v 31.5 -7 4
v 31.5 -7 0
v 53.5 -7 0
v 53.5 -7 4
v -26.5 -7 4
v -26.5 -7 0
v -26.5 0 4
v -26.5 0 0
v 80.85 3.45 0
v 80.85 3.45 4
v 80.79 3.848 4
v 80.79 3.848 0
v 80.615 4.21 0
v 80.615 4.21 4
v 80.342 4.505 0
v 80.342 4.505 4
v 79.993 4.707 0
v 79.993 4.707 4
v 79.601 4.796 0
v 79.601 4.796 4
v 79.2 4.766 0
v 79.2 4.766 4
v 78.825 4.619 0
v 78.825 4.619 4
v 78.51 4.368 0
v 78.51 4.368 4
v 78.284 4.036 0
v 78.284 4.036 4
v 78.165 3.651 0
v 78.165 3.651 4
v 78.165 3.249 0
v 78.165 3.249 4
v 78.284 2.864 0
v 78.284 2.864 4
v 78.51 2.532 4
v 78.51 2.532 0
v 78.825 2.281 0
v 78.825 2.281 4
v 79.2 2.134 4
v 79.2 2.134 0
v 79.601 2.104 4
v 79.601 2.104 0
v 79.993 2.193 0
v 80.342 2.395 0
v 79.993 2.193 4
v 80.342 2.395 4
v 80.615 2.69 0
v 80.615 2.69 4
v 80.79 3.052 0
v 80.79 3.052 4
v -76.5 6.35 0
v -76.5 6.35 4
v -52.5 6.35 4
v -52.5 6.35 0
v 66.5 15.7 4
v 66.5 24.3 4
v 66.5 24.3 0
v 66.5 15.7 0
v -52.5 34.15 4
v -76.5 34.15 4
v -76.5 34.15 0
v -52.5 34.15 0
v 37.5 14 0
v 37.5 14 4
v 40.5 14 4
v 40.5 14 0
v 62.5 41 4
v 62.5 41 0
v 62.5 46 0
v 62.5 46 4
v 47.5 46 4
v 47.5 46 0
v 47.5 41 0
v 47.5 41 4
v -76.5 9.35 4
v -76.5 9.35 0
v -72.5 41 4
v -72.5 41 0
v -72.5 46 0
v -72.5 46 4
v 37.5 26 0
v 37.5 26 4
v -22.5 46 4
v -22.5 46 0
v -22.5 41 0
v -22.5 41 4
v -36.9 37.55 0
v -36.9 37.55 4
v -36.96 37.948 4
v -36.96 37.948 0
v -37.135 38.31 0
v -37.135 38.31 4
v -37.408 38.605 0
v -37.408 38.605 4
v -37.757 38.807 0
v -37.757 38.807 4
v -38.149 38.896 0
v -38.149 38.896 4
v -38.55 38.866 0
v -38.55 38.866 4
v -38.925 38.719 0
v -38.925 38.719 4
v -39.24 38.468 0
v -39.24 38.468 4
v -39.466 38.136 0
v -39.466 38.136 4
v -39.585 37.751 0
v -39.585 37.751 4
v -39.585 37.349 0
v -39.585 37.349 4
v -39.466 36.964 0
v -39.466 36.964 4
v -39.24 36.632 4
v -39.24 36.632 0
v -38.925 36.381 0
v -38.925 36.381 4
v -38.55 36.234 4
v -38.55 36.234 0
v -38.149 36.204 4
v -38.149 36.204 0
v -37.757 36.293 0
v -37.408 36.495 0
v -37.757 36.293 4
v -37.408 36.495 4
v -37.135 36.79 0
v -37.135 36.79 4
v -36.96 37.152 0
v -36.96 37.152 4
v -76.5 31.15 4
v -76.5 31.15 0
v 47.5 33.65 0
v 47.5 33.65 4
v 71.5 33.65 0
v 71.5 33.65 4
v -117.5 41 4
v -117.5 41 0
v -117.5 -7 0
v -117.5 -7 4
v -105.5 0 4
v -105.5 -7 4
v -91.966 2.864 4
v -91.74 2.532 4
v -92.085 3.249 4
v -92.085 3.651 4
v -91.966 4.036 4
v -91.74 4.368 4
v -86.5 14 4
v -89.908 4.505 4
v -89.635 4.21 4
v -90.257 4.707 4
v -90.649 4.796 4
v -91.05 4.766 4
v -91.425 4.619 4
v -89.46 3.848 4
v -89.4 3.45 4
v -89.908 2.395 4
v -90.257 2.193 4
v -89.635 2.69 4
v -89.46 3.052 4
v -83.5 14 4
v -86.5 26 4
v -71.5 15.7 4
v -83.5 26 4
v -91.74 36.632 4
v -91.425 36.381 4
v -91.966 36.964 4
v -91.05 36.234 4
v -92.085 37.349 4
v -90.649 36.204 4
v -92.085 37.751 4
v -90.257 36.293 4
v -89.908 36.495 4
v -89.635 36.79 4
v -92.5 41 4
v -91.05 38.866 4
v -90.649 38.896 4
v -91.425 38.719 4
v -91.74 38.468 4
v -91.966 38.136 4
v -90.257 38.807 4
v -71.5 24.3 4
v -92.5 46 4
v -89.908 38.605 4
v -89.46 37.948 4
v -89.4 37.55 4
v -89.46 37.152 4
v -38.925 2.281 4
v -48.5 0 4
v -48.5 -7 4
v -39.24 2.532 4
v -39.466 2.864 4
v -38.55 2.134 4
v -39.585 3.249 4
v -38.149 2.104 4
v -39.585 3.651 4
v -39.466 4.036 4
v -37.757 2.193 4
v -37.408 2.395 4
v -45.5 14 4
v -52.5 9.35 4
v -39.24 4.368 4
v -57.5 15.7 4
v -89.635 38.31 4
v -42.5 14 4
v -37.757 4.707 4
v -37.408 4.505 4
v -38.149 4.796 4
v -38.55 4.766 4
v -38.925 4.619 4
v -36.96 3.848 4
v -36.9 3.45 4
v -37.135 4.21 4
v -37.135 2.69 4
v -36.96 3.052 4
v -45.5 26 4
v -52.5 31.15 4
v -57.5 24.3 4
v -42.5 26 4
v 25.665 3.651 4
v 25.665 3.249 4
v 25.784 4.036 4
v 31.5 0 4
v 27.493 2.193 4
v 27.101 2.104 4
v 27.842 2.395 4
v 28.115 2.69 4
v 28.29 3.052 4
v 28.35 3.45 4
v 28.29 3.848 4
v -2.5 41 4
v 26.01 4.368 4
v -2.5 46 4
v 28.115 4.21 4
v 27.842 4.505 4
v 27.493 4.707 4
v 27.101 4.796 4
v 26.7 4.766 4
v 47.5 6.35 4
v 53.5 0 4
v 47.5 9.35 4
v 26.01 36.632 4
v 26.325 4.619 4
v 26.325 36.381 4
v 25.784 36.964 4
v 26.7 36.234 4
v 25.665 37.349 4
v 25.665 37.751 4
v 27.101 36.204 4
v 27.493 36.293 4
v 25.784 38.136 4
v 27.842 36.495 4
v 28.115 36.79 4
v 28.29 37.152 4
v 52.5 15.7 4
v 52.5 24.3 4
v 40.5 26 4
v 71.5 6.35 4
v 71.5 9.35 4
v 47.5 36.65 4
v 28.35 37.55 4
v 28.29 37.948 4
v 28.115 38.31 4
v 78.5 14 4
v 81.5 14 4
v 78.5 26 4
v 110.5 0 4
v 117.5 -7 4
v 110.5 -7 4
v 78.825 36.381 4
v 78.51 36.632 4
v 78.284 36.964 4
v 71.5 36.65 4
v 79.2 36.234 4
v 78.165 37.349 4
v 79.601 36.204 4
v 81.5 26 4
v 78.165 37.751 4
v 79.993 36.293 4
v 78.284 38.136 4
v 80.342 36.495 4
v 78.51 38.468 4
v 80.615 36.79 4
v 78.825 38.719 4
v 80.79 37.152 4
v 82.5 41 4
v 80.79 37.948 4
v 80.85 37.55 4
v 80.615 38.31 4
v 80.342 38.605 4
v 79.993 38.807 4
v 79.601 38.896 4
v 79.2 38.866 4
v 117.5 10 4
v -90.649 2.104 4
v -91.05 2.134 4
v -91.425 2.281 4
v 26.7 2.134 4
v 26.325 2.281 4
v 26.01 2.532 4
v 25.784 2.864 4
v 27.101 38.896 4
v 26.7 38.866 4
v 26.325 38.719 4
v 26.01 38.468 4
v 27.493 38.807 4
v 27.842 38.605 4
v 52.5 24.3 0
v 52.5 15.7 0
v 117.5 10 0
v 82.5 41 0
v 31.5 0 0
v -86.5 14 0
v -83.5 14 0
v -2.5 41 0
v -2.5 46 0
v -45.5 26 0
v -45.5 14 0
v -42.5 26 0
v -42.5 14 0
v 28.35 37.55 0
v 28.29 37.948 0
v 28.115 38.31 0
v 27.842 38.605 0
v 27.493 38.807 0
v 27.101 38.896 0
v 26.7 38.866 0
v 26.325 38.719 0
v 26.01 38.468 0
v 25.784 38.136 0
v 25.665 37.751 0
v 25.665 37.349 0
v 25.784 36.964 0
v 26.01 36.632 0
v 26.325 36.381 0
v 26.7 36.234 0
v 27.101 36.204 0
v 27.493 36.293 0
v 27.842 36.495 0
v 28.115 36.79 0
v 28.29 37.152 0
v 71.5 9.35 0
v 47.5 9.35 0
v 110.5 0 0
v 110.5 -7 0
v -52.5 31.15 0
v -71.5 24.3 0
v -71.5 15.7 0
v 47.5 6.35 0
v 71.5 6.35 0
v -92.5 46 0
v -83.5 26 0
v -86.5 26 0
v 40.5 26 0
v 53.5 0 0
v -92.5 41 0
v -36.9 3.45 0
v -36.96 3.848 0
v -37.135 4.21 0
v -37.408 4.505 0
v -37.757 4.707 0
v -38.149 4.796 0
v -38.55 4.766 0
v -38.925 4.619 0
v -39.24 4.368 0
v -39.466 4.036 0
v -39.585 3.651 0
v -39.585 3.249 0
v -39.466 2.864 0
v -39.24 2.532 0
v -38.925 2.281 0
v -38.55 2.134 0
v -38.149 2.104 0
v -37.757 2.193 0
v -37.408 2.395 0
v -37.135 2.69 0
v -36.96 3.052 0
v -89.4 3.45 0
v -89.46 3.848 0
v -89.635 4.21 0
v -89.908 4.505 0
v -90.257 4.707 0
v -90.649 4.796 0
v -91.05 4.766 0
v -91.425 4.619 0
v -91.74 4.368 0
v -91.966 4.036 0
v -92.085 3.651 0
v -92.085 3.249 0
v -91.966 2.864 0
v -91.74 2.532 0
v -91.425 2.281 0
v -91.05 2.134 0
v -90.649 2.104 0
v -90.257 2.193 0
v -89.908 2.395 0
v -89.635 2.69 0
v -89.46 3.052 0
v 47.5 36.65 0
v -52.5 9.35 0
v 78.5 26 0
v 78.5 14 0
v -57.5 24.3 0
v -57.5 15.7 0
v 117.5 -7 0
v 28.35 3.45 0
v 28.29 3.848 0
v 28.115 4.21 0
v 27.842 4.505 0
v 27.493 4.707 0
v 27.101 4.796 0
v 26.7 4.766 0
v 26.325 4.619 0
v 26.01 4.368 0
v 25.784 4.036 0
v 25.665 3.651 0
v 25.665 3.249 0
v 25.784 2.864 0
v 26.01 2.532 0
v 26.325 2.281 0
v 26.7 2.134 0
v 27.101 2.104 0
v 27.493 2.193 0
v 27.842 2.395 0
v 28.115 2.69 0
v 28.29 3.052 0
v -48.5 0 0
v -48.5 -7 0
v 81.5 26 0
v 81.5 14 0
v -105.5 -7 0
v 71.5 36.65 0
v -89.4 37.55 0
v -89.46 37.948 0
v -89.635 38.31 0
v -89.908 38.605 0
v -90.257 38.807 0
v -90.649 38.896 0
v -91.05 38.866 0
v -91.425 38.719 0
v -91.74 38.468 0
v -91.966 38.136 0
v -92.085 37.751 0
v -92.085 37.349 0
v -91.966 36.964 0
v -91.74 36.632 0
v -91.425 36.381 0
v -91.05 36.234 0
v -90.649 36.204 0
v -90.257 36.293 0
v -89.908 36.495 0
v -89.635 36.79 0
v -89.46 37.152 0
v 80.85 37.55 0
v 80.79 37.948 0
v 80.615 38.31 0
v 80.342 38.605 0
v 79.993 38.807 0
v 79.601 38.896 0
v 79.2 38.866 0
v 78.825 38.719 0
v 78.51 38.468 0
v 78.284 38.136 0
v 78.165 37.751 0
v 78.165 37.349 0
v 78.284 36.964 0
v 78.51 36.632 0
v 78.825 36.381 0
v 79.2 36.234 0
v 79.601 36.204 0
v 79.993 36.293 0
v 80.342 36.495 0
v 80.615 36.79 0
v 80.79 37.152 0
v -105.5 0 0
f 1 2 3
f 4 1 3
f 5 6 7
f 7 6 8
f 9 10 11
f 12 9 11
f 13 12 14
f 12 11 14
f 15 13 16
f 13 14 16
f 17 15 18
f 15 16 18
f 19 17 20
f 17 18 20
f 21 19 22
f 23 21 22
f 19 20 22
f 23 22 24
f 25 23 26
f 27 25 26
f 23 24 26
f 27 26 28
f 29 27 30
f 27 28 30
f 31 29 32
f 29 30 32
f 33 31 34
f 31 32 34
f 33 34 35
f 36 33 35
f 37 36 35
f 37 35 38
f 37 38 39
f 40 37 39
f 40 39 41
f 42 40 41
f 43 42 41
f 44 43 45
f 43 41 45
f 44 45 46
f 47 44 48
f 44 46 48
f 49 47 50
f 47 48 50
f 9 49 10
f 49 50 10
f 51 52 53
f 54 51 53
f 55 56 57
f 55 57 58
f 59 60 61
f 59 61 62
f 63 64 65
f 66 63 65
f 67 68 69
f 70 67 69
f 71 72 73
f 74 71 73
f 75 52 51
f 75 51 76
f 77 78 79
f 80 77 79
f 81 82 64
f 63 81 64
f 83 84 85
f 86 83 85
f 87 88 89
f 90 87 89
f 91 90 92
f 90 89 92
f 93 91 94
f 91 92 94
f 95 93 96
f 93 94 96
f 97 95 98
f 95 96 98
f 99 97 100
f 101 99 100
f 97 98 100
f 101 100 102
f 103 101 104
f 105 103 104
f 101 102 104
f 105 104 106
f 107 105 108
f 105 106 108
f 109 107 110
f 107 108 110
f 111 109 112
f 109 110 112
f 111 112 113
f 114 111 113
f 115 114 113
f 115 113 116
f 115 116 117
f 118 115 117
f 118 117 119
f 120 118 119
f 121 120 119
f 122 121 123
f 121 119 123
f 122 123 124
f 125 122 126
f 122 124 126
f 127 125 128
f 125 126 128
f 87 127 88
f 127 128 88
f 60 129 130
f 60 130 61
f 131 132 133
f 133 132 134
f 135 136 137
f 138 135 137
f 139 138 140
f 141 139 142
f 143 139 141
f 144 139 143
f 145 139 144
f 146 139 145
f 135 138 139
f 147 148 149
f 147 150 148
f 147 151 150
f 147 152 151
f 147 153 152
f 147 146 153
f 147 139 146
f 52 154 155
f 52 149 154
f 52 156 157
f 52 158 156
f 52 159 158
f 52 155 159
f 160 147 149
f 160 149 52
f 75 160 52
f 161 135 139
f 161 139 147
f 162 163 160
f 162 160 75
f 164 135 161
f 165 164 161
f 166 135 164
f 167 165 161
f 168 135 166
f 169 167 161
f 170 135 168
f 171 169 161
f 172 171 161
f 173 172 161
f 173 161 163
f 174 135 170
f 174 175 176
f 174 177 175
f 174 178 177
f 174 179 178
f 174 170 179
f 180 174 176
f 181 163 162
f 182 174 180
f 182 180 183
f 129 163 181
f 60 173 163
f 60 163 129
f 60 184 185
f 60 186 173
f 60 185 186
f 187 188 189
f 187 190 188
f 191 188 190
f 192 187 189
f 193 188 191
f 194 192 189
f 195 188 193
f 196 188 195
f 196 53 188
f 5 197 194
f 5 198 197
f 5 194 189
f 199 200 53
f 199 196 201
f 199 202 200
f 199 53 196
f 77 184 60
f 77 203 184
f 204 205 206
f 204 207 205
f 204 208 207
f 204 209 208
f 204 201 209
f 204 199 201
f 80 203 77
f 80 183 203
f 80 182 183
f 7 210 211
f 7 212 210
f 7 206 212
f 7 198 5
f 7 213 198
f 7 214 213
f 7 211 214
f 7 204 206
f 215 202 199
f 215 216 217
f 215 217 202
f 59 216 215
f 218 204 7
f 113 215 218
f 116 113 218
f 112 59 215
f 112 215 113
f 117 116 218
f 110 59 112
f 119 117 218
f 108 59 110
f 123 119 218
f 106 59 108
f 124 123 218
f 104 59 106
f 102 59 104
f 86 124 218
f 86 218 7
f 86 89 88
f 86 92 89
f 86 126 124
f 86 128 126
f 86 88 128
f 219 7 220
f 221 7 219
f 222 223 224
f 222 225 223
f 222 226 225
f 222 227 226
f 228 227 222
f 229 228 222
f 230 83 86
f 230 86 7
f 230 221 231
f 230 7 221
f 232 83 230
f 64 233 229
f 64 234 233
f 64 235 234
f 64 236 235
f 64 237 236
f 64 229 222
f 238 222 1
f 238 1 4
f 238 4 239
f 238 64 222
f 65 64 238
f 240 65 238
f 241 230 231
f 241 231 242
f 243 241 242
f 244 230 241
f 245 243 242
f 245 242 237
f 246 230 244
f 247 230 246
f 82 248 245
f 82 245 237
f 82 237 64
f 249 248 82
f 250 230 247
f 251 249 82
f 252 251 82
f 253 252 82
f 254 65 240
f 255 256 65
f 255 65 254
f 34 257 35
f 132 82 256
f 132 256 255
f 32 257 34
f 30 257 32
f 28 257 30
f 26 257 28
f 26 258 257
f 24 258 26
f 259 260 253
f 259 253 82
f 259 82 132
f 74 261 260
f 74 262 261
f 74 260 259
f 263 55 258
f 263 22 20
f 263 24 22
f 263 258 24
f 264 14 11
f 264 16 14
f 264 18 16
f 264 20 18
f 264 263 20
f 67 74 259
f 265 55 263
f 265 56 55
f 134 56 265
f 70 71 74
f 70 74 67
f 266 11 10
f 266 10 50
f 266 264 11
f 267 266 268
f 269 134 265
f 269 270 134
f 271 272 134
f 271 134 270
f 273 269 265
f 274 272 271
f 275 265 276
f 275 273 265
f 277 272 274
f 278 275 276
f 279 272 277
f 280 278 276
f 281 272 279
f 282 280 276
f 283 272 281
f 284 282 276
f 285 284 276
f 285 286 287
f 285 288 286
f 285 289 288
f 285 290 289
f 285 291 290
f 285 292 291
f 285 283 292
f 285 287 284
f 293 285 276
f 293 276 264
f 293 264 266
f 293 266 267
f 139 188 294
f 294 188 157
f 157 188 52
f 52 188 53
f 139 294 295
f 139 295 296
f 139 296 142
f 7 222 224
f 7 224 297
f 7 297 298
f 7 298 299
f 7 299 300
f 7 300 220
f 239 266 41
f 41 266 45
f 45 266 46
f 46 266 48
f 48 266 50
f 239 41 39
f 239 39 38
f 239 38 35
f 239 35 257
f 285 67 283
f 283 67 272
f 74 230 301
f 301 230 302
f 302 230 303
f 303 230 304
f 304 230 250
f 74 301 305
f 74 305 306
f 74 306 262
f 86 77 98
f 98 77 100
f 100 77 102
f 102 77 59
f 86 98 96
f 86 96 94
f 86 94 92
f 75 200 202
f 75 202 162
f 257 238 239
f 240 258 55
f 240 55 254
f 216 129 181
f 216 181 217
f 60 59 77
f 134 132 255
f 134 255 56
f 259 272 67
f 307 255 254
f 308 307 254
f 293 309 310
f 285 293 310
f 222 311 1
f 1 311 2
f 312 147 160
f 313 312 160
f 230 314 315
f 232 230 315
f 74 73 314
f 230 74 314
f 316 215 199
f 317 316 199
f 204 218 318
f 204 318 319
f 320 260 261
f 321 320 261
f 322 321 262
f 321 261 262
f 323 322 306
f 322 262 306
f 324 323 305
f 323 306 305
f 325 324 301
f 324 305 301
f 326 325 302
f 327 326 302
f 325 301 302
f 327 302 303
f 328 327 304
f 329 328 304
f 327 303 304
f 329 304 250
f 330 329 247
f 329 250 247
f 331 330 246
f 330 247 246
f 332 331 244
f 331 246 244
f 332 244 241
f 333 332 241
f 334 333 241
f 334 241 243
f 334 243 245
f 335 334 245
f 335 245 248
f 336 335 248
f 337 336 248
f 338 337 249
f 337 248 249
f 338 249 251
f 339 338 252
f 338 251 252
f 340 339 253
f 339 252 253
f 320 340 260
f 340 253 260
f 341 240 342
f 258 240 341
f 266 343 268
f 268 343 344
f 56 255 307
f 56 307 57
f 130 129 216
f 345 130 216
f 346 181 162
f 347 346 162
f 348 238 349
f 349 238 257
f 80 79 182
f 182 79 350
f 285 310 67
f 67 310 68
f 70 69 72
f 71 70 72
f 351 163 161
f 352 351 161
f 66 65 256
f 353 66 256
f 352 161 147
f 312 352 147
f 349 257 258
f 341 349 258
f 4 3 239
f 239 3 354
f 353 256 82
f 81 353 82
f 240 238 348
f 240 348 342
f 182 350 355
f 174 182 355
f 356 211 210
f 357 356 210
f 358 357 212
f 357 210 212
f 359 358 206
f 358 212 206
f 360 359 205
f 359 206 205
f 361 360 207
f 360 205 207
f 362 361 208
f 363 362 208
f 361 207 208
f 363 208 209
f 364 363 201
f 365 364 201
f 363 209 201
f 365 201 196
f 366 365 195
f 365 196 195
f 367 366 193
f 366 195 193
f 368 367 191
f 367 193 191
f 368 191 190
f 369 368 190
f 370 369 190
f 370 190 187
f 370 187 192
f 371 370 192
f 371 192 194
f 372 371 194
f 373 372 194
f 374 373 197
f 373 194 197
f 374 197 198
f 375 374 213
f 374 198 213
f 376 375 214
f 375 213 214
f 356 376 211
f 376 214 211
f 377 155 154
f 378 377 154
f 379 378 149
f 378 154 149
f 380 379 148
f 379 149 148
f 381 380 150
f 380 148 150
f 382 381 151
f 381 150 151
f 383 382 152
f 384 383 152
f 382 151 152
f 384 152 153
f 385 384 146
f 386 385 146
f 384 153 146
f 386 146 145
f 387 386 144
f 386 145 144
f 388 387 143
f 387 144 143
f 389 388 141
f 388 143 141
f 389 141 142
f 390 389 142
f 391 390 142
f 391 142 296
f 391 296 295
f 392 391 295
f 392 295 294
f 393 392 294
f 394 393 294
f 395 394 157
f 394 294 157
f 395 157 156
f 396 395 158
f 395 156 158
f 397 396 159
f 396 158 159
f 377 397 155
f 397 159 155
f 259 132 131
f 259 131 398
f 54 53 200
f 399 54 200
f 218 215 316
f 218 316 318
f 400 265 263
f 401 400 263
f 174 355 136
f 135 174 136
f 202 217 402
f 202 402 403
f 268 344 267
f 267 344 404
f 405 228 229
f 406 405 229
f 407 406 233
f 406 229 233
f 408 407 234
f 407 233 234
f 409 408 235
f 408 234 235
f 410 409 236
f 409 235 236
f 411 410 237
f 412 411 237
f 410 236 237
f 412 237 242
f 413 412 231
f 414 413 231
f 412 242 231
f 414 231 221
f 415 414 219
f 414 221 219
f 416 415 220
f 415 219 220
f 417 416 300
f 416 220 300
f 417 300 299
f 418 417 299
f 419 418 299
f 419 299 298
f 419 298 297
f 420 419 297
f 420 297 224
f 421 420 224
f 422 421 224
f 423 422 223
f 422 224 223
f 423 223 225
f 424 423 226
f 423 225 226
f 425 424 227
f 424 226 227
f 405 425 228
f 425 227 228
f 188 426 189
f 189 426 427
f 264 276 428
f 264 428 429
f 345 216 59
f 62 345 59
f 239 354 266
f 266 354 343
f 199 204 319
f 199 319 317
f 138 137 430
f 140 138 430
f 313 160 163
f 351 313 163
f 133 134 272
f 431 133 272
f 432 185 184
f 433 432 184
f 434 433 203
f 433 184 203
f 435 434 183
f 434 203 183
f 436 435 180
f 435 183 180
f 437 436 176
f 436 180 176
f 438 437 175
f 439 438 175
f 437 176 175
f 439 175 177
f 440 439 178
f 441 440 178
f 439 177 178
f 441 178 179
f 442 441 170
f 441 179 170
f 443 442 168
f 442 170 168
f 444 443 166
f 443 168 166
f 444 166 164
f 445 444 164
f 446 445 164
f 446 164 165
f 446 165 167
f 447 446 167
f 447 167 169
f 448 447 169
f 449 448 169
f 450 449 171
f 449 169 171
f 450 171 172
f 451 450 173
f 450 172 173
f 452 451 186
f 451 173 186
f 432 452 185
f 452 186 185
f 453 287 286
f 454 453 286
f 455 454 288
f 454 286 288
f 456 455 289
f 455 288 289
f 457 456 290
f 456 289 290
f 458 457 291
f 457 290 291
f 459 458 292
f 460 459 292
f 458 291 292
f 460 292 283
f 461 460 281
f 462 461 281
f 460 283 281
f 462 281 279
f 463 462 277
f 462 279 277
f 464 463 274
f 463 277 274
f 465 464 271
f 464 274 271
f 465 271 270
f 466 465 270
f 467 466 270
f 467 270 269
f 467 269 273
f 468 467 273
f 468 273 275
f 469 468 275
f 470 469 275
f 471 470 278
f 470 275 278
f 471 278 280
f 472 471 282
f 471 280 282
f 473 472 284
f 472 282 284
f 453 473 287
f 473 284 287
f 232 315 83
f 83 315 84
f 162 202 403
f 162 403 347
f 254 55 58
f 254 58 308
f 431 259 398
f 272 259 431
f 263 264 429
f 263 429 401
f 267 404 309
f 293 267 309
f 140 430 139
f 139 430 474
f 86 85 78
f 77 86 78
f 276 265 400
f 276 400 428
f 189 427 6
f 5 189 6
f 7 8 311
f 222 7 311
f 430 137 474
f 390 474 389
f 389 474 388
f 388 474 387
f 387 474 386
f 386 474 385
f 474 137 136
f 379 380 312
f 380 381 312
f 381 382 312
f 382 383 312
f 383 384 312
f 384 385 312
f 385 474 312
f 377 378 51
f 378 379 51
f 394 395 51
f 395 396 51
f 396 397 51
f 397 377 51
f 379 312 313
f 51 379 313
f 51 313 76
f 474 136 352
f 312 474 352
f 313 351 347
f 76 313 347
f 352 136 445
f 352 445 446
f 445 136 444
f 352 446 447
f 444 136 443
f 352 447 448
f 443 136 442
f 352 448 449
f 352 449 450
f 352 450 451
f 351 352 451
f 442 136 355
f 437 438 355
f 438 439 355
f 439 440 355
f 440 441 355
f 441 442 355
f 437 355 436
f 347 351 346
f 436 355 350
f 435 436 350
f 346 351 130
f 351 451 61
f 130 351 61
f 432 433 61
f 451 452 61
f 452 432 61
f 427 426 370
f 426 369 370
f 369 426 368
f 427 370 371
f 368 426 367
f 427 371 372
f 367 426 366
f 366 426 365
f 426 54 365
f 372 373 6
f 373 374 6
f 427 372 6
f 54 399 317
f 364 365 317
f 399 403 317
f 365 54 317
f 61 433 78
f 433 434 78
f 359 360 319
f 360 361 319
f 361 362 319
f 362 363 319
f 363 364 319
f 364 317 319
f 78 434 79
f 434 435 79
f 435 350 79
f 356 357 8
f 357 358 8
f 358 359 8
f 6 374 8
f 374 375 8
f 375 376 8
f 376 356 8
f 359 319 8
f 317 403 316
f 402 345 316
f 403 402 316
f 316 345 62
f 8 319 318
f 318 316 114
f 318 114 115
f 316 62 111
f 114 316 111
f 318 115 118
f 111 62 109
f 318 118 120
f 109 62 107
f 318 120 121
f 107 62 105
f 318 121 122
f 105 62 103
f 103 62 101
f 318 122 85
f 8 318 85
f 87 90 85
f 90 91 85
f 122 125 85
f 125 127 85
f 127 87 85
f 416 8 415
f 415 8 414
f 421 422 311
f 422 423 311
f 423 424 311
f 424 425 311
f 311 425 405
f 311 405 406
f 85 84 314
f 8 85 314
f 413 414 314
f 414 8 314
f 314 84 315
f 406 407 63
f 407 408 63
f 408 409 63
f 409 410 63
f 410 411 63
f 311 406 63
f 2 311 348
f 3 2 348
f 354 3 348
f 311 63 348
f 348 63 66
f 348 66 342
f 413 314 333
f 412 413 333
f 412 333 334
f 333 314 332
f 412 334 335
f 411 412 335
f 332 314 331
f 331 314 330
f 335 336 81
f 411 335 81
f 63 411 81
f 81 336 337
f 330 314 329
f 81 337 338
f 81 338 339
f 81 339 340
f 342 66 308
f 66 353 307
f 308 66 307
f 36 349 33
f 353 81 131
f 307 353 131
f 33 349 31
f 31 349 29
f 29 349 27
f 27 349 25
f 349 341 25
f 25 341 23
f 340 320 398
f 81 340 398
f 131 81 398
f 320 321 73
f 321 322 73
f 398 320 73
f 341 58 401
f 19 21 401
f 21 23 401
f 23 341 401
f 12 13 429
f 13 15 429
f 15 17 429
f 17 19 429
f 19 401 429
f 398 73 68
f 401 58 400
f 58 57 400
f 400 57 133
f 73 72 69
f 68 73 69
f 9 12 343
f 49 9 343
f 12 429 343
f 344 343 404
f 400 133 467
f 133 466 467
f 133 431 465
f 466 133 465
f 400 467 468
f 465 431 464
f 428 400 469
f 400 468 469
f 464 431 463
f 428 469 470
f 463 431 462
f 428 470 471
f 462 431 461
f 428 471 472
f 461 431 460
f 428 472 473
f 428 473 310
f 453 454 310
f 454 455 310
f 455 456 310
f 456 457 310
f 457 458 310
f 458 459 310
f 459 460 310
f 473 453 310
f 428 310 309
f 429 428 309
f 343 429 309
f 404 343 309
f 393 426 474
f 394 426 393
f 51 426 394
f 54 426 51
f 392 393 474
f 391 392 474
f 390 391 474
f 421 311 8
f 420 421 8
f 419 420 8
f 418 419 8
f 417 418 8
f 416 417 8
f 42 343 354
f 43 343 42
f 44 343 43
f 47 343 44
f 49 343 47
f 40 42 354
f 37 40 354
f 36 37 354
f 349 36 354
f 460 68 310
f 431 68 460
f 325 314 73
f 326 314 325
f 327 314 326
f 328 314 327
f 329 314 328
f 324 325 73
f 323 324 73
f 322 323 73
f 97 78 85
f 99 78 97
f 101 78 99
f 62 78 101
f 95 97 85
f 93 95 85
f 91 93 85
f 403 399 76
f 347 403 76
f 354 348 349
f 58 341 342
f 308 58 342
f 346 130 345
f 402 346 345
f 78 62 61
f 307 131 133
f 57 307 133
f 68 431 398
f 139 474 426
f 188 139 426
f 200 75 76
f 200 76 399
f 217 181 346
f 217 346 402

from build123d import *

# Parameters (mm, degrees)
BOSS_EXTRUDE2_DEPTH = 4
CUT_EXTRUDE1_DEPTH  = 4
SKETCH4_R           = 1.35
CUT_EXTRUDE2_DEPTH  = 4
SKETCH6_W           = 24
SKETCH6_H           = 3
CUT_EXTRUDE3_DEPTH  = 4


with BuildPart() as part:
    # Sketch1 → Boss-Extrude2 (new body)
    with BuildSketch(Plane.XY):
        Polygon((-105.5, 0), (-48.5, 0), (-48.5, -7), (-26.5, -7), (-26.5, 0), (31.5, 0), (31.5, -7), (53.5, -7), (53.5, 0), (110.5, 0), (110.5, -7), (117.5, -7), (117.5, 0), (117.5, 10), (82.5, 41), (62.5, 41), (62.5, 46), (47.5, 46), (47.5, 41), (-2.5, 41), (-2.5, 46), (-22.5, 46), (-22.5, 41), (-72.5, 41), (-72.5, 46), (-92.5, 46), (-92.5, 41), (-117.5, 41), (-117.5, 0), (-117.5, -7), (-105.5, -7), align=None)
    extrude(amount=BOSS_EXTRUDE2_DEPTH)

    # Sketch2 → Cut-Extrude1 (cut)
    with BuildSketch(Plane.XY.offset(4)):
        Polygon((-71.5, 20), (-71.5, 24.3), (-57.5, 24.3), (-57.5, 15.7), (-71.5, 15.7), align=None)
        Polygon((52.5, 20), (52.5, 24.3), (66.5, 24.3), (66.5, 15.7), (52.5, 15.7), align=None)
    extrude(amount=-CUT_EXTRUDE1_DEPTH, mode=Mode.SUBTRACT)

    # Sketch4 → Cut-Extrude2 (cut)
    with BuildSketch(Plane.XY.offset(4)):
        with Locations((-38.25, 37.55)):
            Circle(SKETCH4_R)
        with Locations((-90.75, 37.55)):
            Circle(SKETCH4_R)
        with Locations((-90.75, 3.45)):
            Circle(SKETCH4_R)
        with Locations((-38.25, 3.45)):
            Circle(SKETCH4_R)
        with Locations((27, 37.55)):
            Circle(SKETCH4_R)
        with Locations((79.5, 37.55)):
            Circle(SKETCH4_R)
        with Locations((79.5, 3.45)):
            Circle(SKETCH4_R)
        with Locations((27, 3.45)):
            Circle(SKETCH4_R)
    extrude(amount=-CUT_EXTRUDE2_DEPTH, mode=Mode.SUBTRACT)

    # Sketch6 → Cut-Extrude3 (cut)
    with BuildSketch(Plane.XY.offset(4)):
        with Locations((-64.5, 32.65)):
            Rectangle(SKETCH6_W, SKETCH6_H)
        with Locations((-64.5, 7.85)):
            Rectangle(SKETCH6_W, SKETCH6_H)
        with Locations((59.5, 35.15)):
            Rectangle(SKETCH6_W, SKETCH6_H)
        with Locations((59.5, 7.85)):
            Rectangle(SKETCH6_W, SKETCH6_H)
        Polygon((-83.5, 20), (-83.5, 26), (-86.5, 26), (-86.5, 14), (-83.5, 14), align=None)
        Polygon((-45.5, 20), (-45.5, 26), (-42.5, 26), (-42.5, 14), (-45.5, 14), align=None)
        Polygon((40.5, 20), (40.5, 26), (37.5, 26), (37.5, 14), (40.5, 14), align=None)
        Polygon((78.5, 20), (78.5, 26), (81.5, 26), (81.5, 14), (78.5, 14), align=None)
    extrude(amount=-CUT_EXTRUDE3_DEPTH, mode=Mode.SUBTRACT)


solid = part.part
